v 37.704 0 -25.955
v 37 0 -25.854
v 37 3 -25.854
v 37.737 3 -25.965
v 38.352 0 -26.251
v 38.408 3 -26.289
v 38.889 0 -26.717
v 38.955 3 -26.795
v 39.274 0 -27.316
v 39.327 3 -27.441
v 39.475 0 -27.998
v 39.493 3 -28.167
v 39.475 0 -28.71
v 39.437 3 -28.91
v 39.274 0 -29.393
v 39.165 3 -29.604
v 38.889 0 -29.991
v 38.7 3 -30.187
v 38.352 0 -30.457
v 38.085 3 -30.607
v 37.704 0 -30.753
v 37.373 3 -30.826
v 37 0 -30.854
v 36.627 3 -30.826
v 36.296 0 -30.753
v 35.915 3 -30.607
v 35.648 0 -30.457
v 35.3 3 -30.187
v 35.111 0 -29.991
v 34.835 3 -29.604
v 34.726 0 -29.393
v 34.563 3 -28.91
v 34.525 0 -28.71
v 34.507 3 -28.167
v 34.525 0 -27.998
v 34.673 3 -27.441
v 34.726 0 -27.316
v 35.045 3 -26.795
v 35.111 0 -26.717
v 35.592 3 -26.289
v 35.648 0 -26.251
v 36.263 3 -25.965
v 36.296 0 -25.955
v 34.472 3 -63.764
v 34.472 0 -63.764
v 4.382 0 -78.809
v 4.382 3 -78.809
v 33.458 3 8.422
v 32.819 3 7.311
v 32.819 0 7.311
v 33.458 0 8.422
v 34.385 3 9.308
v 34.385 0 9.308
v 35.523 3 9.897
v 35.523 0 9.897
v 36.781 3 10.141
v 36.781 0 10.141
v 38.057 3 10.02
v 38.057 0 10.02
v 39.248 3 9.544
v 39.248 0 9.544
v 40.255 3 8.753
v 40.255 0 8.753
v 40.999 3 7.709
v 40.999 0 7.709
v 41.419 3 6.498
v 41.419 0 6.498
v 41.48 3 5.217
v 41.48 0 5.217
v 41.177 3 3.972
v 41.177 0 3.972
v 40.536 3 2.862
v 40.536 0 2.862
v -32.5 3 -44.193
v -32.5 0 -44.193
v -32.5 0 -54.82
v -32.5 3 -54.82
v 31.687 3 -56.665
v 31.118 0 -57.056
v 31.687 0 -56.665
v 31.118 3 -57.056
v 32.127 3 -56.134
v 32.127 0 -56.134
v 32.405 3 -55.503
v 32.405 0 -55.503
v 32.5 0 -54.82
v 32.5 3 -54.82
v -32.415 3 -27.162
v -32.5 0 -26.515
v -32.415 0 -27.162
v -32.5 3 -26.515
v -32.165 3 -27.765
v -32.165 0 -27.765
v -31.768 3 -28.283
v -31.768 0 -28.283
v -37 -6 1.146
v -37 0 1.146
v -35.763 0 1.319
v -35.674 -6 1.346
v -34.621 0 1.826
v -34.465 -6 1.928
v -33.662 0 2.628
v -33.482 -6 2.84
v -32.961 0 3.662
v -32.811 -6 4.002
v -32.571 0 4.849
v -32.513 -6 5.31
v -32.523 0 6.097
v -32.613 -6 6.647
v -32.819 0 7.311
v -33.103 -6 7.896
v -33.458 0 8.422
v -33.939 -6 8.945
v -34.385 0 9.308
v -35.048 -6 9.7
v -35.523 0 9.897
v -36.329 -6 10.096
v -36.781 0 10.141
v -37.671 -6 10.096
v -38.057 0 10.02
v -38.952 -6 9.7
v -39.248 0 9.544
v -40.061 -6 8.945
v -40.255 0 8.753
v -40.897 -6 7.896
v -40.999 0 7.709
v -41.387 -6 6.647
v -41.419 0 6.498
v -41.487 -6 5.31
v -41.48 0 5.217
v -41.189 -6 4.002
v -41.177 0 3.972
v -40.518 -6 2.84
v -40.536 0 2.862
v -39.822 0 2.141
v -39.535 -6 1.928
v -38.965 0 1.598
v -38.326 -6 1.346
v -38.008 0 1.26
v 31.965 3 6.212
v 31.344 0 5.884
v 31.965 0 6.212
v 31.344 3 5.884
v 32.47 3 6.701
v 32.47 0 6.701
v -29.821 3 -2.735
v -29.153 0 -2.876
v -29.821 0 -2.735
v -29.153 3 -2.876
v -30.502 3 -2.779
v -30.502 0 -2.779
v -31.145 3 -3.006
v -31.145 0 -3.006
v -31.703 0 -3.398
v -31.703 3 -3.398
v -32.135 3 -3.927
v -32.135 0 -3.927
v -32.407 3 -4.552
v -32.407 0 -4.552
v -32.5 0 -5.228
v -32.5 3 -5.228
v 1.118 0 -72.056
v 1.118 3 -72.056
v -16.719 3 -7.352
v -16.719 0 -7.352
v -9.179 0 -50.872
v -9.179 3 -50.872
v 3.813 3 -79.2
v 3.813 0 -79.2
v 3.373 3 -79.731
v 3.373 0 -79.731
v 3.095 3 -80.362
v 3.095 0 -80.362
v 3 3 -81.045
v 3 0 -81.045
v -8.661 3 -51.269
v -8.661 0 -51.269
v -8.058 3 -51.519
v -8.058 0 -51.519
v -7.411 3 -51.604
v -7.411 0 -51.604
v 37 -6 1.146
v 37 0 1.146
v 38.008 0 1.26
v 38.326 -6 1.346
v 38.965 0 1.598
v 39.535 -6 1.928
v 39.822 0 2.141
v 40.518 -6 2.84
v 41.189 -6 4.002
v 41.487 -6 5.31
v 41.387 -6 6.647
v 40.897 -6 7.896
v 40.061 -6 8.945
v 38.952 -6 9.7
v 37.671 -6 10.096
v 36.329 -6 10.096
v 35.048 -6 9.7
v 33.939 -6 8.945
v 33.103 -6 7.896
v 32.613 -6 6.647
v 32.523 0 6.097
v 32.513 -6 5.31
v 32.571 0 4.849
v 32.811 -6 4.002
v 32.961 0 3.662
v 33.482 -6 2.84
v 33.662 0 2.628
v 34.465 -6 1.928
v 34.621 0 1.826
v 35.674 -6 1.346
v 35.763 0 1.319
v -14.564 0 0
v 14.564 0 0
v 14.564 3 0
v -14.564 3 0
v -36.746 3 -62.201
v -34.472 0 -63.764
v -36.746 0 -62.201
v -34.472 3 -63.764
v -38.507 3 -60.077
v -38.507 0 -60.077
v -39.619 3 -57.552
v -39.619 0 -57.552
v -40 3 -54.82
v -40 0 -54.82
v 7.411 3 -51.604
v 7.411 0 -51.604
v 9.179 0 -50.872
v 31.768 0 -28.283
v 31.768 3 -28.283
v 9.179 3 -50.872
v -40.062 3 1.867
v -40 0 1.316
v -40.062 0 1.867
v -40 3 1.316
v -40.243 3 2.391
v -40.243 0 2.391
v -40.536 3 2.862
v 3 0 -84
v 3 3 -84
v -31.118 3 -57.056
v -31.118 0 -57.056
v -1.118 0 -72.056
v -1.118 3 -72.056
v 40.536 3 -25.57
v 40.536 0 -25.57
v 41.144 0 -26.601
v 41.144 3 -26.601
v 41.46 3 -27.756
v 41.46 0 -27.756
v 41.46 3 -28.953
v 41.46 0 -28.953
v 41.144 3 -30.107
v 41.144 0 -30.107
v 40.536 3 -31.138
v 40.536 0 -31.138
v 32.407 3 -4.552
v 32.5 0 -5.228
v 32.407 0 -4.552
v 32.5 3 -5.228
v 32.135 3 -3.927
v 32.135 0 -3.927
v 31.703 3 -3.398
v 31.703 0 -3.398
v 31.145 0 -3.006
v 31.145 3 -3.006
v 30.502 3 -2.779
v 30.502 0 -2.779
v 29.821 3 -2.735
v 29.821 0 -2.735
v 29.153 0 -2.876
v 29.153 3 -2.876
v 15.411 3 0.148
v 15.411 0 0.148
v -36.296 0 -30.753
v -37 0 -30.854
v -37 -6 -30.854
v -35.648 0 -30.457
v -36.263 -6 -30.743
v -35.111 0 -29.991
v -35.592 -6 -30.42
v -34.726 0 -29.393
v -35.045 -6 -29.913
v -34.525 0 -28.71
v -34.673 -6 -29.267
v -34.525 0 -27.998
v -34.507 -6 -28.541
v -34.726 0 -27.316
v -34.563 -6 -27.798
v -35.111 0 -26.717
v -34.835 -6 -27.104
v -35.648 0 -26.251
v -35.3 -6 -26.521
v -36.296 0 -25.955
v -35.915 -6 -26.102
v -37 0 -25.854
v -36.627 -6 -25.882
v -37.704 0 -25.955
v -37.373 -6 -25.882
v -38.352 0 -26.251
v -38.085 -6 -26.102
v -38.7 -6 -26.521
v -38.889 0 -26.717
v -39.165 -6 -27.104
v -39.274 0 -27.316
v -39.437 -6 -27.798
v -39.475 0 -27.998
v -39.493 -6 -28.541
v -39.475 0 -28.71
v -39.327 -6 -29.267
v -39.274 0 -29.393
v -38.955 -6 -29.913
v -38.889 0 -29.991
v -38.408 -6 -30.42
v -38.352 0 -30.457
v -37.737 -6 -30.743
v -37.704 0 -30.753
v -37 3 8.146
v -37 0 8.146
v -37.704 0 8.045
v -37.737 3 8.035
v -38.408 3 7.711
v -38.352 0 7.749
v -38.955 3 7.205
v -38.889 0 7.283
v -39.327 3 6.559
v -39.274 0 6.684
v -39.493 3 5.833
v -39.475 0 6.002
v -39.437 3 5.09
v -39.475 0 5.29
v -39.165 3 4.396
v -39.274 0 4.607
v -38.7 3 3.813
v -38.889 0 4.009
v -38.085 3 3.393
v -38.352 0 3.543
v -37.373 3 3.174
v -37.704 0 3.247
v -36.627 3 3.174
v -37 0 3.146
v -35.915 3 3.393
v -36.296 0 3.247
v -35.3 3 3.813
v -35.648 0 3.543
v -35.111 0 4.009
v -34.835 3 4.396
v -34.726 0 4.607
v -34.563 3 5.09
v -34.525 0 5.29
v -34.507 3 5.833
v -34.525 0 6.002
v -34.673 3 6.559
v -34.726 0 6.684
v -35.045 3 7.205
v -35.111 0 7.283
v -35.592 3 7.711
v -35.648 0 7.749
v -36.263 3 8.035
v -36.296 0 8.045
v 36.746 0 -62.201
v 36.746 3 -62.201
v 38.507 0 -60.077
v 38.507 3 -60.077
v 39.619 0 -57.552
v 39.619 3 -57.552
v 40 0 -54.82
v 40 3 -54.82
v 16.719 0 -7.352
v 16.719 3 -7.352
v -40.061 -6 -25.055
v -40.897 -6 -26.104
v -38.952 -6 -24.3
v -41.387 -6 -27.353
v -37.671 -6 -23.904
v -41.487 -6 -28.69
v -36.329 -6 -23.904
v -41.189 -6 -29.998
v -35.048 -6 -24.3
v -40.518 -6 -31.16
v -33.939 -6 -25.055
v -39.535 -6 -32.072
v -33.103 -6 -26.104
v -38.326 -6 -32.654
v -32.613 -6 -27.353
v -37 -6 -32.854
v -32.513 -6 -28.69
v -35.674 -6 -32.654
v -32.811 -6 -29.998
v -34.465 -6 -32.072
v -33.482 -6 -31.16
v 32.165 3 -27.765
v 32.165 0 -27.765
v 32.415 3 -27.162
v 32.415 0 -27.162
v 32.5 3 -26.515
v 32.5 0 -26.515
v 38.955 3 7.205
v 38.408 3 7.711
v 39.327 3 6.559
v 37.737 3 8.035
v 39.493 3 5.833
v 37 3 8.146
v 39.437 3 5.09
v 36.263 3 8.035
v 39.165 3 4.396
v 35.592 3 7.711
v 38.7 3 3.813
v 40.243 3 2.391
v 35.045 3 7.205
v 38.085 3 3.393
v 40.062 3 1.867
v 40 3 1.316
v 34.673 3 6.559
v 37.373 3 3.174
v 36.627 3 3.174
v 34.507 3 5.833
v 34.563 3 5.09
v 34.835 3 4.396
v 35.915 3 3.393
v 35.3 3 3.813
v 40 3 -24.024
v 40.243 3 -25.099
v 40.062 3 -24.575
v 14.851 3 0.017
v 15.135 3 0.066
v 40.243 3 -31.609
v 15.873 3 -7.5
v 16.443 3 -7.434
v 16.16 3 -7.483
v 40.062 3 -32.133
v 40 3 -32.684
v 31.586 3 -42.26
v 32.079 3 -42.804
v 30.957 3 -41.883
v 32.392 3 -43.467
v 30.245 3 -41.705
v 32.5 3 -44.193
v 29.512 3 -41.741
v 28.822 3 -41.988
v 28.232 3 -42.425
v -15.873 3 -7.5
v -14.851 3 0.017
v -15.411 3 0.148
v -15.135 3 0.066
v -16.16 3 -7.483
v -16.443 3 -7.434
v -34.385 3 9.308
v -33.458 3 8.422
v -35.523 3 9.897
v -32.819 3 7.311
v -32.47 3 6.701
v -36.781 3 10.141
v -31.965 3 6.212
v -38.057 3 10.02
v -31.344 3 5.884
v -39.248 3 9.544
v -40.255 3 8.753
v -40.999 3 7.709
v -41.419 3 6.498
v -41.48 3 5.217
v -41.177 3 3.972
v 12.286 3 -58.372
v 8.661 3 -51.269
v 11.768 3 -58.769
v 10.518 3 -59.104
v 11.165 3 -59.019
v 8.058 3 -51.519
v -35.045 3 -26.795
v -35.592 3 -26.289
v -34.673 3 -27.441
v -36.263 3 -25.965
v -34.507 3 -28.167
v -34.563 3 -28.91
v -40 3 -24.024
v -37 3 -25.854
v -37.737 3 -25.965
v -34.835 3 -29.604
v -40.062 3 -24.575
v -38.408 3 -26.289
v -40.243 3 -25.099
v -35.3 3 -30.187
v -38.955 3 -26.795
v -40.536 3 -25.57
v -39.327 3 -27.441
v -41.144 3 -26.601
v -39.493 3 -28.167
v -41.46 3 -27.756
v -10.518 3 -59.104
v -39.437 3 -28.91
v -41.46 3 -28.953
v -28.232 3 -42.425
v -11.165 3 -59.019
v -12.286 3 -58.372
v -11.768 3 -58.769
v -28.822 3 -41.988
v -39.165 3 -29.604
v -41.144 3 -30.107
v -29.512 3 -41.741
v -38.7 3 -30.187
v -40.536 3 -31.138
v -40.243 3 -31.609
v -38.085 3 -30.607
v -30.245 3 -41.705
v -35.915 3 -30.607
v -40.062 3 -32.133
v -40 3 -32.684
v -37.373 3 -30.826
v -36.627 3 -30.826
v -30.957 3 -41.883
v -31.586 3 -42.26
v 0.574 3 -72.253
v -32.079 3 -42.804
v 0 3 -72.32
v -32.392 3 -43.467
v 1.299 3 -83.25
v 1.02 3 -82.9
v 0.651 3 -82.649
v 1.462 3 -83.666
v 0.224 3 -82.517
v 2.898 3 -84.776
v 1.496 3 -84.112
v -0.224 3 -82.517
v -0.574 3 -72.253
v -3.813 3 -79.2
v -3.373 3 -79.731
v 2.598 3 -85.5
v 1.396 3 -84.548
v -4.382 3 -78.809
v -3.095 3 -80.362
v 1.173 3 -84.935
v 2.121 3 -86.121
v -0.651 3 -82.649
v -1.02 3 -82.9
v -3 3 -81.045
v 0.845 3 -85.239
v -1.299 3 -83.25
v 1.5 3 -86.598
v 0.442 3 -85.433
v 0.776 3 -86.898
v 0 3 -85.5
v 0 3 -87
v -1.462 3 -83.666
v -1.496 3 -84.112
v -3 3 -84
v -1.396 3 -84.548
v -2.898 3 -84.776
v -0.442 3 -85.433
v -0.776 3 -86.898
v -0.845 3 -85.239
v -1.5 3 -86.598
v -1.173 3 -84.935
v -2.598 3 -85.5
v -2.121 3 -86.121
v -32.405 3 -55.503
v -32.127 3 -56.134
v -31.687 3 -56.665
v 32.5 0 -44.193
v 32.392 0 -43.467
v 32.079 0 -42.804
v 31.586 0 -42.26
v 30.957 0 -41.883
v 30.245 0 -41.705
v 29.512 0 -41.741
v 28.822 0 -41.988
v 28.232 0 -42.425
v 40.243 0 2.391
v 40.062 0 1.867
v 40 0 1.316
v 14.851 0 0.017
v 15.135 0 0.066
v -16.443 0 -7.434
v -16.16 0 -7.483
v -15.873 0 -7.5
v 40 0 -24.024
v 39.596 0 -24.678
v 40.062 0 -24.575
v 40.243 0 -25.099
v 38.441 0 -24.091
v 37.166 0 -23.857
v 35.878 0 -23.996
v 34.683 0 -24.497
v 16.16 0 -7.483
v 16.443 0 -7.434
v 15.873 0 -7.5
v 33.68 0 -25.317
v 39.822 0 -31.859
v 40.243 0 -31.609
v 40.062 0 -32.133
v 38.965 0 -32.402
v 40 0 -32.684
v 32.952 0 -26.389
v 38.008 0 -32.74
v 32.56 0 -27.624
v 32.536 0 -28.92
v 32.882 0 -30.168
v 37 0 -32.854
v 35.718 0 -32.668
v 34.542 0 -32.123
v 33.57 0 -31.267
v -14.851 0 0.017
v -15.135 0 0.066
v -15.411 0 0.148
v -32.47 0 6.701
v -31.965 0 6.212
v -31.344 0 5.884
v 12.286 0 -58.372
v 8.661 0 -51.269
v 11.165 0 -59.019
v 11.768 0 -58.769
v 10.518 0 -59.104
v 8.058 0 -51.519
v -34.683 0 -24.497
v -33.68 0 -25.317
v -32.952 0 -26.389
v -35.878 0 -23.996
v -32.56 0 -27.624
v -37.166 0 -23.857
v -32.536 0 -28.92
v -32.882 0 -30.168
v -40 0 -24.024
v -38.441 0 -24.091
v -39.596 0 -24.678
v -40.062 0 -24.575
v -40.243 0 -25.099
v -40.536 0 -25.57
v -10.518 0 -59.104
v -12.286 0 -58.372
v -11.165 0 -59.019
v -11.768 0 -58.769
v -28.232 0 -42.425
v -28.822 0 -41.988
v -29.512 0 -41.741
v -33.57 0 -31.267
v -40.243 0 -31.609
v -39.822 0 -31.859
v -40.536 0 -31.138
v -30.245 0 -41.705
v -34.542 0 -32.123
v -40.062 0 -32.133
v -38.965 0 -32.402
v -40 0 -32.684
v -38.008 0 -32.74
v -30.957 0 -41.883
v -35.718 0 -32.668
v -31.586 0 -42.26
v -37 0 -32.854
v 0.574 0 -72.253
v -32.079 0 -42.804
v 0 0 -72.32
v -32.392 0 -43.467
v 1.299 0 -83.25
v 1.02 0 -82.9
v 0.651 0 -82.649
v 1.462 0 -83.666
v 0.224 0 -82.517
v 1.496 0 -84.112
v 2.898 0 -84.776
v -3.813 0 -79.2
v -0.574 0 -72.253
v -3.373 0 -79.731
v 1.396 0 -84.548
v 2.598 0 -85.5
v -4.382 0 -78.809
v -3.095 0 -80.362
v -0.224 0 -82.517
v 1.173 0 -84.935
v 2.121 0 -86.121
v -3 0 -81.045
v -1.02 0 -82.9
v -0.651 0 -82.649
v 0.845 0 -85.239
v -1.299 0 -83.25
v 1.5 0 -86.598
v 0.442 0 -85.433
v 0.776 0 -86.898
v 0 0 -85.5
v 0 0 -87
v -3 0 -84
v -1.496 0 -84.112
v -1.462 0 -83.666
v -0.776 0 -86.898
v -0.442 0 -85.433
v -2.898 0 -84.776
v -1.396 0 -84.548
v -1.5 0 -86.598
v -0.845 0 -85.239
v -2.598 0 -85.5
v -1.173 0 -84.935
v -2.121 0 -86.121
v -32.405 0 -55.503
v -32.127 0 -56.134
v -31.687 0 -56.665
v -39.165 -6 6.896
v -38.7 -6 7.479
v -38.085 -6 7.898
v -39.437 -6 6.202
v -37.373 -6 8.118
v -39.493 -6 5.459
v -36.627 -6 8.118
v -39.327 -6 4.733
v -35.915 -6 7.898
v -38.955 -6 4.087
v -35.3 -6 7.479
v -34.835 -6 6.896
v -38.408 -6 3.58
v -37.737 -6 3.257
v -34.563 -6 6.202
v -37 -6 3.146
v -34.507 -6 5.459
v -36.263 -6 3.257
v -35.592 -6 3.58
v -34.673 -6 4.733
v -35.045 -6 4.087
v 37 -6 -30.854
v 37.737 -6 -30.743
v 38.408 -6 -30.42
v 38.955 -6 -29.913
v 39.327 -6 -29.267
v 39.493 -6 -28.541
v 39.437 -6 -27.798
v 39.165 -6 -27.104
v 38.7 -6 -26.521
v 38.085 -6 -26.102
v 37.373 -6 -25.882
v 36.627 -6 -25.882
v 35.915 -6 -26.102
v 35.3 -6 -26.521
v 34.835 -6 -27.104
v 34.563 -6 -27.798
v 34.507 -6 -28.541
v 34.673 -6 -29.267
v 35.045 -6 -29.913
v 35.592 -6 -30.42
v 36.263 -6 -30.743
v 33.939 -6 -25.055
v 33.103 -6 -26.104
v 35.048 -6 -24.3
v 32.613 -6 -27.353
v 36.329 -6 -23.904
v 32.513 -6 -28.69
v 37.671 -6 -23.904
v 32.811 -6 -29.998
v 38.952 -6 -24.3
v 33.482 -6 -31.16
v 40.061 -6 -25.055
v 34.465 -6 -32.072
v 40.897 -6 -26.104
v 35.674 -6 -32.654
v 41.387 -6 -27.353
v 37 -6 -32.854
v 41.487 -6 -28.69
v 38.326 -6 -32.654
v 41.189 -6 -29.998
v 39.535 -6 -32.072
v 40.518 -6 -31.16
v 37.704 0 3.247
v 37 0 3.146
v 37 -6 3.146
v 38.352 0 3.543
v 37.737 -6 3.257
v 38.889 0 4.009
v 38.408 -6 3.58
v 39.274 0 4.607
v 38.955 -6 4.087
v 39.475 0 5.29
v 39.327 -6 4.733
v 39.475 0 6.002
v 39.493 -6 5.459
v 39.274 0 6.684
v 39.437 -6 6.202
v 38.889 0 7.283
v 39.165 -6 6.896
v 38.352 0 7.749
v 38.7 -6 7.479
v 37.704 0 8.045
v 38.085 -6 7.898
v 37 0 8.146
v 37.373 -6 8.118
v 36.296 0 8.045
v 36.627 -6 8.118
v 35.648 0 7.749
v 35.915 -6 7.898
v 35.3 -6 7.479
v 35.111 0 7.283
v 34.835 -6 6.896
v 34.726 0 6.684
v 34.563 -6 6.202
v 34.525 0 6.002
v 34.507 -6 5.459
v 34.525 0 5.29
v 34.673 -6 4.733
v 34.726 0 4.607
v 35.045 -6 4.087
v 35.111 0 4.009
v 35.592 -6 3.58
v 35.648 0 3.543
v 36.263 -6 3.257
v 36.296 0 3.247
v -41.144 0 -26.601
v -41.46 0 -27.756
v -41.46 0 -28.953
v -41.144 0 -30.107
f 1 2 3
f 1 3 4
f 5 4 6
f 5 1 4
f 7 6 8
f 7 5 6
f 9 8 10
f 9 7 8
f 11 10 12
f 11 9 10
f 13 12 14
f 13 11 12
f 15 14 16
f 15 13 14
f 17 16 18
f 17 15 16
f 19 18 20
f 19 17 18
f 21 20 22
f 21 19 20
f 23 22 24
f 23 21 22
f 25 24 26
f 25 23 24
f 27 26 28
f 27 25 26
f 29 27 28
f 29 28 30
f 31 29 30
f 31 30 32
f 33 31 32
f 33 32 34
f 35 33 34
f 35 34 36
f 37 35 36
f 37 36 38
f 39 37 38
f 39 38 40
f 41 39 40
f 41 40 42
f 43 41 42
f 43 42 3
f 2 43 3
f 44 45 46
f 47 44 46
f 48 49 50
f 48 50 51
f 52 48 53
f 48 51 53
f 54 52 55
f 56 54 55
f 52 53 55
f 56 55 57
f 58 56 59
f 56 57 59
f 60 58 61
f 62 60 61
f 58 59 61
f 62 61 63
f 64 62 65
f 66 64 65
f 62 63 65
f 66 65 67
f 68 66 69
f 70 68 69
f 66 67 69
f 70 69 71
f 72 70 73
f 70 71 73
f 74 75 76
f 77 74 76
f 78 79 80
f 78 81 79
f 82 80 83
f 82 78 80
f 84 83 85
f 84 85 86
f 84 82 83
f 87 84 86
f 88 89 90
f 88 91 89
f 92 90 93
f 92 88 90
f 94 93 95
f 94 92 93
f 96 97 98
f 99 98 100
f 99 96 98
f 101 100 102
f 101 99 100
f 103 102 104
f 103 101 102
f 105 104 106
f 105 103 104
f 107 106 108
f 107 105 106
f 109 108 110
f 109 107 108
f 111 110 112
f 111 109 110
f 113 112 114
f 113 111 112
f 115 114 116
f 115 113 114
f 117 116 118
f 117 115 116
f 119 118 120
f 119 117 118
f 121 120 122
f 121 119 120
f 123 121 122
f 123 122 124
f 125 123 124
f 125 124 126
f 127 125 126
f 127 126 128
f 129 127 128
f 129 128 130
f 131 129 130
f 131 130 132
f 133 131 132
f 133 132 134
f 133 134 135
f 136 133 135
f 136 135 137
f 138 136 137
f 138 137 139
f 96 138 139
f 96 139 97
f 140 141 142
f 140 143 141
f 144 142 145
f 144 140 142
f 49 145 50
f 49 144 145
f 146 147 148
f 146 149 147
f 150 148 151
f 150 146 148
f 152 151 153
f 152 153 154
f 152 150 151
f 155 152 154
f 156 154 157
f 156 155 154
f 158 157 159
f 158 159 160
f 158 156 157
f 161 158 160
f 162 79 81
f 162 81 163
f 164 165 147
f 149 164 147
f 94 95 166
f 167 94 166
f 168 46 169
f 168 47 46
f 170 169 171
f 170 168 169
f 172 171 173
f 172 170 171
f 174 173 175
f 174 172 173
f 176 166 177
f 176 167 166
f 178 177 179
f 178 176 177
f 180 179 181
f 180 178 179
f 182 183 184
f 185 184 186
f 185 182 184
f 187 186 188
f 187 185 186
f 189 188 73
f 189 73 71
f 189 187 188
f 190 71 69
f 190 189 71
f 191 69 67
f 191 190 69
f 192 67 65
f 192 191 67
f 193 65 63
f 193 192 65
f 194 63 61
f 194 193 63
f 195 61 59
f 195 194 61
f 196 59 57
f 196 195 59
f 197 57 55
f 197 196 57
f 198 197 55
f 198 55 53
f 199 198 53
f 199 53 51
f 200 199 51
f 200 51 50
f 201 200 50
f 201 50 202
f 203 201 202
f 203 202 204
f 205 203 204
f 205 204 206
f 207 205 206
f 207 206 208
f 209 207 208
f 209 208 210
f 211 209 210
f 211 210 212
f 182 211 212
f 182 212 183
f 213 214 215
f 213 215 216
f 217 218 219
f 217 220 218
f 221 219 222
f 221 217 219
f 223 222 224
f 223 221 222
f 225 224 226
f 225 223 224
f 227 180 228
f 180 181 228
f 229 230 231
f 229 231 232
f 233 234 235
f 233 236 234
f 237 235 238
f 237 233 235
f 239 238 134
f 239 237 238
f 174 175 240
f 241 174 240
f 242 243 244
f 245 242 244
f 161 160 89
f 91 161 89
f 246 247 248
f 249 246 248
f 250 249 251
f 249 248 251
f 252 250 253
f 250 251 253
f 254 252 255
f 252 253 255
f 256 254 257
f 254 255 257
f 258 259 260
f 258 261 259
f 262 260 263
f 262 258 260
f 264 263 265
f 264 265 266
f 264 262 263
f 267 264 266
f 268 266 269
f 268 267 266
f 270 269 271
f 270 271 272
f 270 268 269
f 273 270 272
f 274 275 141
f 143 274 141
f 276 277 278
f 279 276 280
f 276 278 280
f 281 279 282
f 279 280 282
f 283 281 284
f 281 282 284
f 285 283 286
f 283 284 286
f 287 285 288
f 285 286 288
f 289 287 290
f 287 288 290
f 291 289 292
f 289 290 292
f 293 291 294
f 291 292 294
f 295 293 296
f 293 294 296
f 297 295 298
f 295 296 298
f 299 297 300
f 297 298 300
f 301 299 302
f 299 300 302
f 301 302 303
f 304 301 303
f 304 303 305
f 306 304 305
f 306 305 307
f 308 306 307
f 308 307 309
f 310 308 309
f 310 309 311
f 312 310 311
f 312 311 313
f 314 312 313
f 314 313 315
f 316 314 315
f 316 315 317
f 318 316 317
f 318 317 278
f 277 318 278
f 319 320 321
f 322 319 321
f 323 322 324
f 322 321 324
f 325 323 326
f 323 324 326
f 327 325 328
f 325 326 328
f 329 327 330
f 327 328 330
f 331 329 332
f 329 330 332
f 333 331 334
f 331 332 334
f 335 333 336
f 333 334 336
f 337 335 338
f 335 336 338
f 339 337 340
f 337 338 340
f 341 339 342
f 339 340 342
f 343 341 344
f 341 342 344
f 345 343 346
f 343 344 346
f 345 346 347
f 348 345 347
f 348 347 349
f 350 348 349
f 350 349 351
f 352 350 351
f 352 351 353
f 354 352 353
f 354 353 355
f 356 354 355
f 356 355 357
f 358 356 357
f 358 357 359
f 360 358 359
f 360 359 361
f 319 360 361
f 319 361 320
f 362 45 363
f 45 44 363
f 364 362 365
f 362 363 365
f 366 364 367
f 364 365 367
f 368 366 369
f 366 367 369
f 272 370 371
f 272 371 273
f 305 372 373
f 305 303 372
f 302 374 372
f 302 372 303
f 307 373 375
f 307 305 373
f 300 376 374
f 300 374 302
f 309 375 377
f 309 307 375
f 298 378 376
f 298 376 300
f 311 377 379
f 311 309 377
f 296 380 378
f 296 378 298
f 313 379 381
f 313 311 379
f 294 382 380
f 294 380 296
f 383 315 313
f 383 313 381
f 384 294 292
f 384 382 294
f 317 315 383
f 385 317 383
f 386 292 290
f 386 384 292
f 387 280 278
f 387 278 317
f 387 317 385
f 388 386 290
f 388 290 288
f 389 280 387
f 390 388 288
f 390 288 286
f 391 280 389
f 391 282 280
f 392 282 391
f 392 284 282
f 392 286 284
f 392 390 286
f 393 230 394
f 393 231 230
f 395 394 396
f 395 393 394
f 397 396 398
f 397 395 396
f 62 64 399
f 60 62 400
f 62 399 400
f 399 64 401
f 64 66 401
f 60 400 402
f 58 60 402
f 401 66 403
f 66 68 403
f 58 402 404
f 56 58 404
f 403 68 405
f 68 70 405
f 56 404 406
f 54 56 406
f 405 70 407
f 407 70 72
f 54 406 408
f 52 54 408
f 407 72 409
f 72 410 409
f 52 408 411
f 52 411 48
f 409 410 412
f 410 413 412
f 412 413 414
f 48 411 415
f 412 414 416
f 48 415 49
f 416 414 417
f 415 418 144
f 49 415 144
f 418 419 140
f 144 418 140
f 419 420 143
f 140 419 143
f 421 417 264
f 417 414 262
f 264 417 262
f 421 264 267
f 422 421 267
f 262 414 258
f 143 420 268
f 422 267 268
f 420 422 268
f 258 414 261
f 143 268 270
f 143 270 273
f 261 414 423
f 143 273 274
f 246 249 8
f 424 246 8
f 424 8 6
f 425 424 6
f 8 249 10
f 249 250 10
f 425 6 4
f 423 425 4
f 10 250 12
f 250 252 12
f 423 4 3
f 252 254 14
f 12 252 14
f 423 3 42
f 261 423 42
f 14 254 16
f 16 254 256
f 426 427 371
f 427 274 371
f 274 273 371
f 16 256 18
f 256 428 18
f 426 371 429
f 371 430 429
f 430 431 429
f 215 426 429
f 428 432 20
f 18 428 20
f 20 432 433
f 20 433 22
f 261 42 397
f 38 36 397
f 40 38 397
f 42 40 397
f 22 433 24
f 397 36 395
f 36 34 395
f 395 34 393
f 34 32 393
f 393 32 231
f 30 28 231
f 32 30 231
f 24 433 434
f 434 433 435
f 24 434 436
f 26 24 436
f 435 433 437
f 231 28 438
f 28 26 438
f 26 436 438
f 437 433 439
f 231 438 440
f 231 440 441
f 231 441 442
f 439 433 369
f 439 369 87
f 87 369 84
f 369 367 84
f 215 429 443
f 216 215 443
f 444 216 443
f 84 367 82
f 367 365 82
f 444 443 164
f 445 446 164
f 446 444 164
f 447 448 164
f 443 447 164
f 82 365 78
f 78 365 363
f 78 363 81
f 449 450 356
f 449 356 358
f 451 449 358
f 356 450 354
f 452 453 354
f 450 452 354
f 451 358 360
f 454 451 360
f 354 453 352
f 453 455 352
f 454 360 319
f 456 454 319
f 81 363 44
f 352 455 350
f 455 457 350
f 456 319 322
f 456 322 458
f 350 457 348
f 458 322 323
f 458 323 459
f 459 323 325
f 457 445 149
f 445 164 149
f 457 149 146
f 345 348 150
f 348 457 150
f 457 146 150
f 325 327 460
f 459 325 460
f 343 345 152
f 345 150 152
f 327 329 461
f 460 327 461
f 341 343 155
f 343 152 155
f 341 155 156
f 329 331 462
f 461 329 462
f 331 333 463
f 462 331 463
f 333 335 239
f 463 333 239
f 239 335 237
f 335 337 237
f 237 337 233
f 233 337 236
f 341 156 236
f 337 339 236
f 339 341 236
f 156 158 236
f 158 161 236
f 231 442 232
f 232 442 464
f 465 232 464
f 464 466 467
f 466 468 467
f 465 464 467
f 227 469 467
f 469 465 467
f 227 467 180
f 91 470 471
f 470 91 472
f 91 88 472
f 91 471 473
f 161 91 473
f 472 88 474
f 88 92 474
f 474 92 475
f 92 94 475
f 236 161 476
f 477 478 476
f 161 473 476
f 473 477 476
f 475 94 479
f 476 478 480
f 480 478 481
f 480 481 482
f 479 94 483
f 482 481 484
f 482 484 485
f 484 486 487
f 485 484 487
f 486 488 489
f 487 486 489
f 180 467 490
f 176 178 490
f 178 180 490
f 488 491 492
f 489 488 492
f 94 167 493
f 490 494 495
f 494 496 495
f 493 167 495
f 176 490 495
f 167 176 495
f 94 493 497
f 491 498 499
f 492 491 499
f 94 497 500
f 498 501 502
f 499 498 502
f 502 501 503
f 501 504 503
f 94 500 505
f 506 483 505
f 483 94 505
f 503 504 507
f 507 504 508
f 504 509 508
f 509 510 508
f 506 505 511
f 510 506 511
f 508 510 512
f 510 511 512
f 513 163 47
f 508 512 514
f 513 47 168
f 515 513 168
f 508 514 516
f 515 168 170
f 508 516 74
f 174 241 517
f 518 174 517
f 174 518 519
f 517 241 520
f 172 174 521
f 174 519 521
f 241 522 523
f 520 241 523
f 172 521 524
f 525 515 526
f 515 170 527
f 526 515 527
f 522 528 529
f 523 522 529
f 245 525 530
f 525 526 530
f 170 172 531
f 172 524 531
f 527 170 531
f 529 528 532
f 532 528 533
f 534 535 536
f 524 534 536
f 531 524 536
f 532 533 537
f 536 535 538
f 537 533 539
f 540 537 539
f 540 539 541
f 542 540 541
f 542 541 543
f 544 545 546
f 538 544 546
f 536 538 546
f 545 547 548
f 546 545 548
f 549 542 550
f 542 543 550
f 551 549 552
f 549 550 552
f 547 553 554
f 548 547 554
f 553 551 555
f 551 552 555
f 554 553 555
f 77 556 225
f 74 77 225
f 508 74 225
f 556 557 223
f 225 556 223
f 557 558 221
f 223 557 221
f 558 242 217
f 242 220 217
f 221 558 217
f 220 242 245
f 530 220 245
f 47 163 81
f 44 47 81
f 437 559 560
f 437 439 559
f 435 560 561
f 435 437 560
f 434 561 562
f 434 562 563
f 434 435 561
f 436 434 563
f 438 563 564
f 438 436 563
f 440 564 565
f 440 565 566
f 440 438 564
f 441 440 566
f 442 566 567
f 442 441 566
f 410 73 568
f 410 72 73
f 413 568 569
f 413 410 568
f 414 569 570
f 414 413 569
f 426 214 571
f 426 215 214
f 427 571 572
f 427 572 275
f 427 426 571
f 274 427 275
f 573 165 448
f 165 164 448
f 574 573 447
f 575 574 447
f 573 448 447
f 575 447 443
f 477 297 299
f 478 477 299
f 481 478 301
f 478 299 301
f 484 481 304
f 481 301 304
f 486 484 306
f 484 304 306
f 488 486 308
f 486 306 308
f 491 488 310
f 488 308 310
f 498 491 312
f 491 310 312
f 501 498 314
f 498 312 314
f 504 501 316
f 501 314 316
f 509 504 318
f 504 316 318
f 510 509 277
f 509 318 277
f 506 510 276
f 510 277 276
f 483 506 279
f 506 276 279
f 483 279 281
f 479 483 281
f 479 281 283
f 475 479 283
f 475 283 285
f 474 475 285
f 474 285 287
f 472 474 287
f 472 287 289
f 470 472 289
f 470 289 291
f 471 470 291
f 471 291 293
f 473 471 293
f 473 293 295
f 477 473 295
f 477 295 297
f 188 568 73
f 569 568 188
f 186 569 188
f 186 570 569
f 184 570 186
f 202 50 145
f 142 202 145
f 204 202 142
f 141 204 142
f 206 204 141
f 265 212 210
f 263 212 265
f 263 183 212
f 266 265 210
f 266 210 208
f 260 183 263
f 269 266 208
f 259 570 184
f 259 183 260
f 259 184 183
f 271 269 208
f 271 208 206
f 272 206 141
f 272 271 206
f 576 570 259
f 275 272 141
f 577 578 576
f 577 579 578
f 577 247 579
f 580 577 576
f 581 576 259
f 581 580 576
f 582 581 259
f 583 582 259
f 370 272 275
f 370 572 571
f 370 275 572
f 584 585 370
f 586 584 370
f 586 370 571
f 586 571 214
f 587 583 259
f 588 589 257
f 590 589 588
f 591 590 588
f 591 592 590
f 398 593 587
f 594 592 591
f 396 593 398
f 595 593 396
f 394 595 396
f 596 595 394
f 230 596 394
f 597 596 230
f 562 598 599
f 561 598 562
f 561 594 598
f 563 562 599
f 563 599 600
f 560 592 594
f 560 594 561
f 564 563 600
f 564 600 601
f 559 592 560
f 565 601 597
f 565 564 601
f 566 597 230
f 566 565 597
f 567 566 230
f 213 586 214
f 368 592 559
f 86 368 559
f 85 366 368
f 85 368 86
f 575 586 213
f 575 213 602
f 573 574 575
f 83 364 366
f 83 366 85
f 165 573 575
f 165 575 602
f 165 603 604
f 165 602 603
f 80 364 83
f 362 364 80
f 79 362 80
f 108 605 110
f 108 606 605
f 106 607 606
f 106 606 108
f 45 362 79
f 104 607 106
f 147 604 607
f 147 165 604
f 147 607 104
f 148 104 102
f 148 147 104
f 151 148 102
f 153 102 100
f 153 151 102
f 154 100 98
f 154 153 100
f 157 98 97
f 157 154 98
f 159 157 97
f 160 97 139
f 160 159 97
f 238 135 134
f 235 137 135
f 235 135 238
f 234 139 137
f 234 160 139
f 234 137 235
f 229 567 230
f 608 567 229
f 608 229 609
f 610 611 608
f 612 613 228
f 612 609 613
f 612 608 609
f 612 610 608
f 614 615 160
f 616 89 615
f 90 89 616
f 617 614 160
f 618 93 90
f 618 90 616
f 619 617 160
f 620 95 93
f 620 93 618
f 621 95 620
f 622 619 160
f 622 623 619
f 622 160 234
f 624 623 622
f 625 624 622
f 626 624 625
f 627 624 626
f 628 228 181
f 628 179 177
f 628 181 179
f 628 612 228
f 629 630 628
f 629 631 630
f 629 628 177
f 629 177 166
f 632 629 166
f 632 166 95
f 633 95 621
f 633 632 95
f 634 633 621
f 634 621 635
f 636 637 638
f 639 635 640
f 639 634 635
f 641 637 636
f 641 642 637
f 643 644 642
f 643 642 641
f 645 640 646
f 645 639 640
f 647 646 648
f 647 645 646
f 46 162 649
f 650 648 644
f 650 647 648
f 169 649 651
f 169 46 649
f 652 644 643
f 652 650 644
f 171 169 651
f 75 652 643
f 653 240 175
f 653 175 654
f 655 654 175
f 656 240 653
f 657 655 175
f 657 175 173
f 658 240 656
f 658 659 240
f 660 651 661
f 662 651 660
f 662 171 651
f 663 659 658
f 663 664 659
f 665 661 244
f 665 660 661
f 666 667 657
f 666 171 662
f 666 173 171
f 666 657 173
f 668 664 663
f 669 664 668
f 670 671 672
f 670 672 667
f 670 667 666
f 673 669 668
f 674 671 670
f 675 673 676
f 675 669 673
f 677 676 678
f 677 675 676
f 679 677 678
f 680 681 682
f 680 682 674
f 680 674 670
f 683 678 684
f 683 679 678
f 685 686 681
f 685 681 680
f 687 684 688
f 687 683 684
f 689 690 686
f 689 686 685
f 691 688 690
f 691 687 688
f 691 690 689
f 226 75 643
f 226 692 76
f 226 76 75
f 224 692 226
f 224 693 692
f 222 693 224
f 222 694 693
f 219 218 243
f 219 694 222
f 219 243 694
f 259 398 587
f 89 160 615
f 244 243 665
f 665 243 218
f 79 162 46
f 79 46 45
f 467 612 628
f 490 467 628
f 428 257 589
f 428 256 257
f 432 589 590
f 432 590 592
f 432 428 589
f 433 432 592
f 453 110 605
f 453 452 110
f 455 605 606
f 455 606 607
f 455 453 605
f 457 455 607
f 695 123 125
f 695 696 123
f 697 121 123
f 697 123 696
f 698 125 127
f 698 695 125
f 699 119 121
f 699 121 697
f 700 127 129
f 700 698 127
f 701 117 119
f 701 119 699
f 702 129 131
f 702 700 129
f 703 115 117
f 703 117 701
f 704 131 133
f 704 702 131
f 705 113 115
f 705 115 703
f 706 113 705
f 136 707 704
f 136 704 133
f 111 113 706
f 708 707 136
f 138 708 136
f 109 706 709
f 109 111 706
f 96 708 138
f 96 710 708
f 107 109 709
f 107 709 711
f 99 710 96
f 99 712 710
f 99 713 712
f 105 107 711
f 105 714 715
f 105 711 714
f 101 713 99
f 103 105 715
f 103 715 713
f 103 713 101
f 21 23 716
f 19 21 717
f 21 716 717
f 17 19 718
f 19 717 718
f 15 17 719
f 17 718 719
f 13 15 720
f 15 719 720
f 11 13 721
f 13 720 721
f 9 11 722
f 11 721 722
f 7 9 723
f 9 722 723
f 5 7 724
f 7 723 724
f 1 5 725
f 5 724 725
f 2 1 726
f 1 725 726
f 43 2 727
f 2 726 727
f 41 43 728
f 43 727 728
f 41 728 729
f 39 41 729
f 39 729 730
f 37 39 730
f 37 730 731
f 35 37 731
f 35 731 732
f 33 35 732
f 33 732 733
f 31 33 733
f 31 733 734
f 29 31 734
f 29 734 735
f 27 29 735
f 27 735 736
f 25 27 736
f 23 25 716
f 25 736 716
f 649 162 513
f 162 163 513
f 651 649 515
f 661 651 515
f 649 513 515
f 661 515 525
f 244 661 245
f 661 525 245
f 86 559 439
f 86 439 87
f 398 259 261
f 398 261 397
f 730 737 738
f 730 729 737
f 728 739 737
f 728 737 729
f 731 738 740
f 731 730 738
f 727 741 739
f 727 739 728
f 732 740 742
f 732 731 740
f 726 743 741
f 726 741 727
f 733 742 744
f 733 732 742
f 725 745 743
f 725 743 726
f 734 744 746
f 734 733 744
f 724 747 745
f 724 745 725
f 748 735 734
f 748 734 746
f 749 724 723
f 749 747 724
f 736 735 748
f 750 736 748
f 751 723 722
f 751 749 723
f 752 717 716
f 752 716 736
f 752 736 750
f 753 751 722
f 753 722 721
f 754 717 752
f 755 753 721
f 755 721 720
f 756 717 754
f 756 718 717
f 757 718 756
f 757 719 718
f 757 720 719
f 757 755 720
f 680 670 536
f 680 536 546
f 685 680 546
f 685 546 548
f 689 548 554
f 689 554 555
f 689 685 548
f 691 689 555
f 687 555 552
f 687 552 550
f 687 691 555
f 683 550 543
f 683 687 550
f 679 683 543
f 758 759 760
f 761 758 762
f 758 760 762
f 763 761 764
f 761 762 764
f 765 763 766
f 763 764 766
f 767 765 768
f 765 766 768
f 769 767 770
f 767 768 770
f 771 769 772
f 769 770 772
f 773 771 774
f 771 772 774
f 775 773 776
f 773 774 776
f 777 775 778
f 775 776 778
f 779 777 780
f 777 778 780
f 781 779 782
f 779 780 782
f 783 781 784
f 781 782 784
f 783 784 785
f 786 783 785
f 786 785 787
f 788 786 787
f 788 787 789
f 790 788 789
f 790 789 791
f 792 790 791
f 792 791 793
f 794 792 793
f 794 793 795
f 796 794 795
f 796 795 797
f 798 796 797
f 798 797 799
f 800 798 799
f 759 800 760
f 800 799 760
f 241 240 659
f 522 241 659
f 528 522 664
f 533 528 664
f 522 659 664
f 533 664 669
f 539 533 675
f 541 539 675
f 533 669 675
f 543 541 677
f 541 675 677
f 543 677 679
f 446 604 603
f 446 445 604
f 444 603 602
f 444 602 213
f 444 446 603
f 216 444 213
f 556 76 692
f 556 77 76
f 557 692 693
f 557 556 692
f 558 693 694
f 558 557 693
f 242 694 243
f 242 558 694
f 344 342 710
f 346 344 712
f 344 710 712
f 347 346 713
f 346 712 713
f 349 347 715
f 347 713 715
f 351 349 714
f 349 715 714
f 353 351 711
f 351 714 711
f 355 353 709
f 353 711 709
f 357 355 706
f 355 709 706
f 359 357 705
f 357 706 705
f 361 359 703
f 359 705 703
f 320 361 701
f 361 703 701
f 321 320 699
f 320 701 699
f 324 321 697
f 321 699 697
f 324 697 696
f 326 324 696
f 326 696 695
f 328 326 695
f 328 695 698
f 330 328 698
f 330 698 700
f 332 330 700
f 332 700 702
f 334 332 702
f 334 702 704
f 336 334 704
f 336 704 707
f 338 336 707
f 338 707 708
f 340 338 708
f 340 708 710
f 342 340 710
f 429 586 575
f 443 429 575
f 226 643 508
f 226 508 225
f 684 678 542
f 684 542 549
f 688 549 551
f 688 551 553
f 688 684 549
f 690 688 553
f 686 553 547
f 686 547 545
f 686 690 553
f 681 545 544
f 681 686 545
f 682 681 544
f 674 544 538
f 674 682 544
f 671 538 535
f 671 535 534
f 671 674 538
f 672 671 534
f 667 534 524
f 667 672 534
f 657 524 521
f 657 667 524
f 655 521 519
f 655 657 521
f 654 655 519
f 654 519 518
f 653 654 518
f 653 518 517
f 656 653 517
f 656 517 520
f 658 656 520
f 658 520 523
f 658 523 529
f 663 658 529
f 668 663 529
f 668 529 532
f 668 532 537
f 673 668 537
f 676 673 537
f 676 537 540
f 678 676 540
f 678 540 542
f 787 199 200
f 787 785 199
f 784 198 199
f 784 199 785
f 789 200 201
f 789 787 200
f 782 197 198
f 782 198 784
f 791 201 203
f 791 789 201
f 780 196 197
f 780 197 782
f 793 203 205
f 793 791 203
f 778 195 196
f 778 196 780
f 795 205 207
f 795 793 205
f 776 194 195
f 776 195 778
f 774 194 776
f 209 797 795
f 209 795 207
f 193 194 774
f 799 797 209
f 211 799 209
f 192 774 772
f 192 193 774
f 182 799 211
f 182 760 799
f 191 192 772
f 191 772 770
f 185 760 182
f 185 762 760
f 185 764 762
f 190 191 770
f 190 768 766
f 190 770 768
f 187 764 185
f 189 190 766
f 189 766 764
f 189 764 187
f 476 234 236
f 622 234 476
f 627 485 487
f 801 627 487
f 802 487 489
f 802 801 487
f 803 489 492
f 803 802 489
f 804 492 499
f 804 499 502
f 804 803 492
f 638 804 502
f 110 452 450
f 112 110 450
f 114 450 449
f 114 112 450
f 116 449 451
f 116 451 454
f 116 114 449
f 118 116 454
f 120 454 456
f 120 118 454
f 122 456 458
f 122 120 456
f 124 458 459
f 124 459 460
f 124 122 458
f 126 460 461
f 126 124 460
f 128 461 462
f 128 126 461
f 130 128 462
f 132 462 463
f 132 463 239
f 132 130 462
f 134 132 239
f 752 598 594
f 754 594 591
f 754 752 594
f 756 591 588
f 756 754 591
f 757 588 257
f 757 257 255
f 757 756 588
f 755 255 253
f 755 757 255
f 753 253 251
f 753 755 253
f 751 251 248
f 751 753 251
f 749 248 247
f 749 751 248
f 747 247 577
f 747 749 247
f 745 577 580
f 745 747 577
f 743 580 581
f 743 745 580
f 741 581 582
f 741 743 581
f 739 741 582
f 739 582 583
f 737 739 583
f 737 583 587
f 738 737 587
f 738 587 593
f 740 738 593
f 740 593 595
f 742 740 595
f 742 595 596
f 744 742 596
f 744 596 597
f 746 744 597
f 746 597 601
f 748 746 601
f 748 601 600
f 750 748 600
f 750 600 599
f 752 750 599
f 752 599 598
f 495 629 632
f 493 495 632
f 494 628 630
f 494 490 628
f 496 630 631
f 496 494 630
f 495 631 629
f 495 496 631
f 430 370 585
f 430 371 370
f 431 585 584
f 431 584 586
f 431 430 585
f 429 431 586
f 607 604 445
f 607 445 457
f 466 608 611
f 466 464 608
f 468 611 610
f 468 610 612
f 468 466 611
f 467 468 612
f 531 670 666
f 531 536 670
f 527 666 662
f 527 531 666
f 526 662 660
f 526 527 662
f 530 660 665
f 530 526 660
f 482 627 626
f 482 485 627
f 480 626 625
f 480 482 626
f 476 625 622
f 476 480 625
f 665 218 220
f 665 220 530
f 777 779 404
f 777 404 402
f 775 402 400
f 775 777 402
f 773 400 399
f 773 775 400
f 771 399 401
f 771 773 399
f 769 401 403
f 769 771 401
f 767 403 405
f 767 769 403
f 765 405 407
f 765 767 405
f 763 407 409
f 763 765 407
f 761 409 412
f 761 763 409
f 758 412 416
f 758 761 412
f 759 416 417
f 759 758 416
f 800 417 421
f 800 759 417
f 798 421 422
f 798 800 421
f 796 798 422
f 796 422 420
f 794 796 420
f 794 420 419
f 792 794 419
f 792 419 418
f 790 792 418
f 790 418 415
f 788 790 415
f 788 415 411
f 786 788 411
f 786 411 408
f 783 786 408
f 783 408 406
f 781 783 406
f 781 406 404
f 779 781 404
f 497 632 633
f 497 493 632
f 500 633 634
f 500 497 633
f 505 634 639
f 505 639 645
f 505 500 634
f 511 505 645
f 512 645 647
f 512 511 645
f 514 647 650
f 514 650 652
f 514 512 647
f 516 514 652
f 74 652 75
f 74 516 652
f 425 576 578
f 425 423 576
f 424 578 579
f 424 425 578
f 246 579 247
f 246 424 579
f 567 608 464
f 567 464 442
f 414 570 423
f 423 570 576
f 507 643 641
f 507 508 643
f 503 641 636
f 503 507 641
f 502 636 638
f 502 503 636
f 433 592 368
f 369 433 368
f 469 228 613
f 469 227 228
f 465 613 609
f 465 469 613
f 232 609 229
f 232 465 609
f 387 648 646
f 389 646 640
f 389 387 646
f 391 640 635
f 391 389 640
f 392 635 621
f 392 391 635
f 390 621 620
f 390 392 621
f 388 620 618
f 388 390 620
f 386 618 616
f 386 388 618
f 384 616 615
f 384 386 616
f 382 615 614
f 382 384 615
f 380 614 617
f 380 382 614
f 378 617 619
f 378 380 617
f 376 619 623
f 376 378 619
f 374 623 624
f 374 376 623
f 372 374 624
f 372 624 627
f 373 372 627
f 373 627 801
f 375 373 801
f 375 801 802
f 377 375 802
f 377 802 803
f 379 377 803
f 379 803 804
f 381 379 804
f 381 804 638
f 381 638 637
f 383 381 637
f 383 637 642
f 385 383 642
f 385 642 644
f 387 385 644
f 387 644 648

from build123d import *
from build123d.topology import SkipClean

# Parameters (mm, degrees)
SKETCH1_R            = 2.5
BOSS_EXTRUDE1_DEPTH  = 3
CUT_EXTRUDE2_START   = -3
CUT_EXTRUDE2_DEPTH   = 3
FILLET2_R            = 10
FILLET2_OF_MIRROR1_R = 10
FILLET3_R            = 2.5
BOSS_EXTRUDE2_START  = 6
SKETCH4_R            = 4.5
SKETCH4_R_2          = 2.5
BOSS_EXTRUDE2_DEPTH  = 6


# Read off the part's stored shape, not the designer's step: Cut-Extrude2
with BuildPart() as part:
    # Sketch1 → Boss-Extrude1 (new body)
    with BuildSketch(Plane(origin=(0, 0, 0), x_dir=(1, 0, 0), z_dir=(0, 1, 0))):
        with BuildLine():
            Line((0, 0), (15, 0))
            Line((15, 0), (32.55050158, -6.318180569))
            ThreePointArc((32.55050158, -6.318180569), (39.139673913, -9.604659904), (40, -2.291796068))
            Line((40, -2.291796068), (40, 25))
            ThreePointArc((40, 25), (41.5, 28.354101966), (40, 31.708203932))
            Line((40, 31.708203932), (40, 61))
            Line((40, 61), (3, 79.5))
            Line((3, 79.5), (3, 84))
            ThreePointArc((3, 84), (2.121320344, 86.121320344), (0, 87))
            Line((0, 87), (0, 85.5))
            ThreePointArc((0, 85.5), (1.5, 84), (0, 82.5))
            Line((0, 82.5), (0, 0))
        make_face()
        with Locations(Location((37, -5.645898034, 0), (0, 0, 270))):
            Circle(SKETCH1_R, mode=Mode.SUBTRACT)
        with Locations(Location((37, 28.354101966, 0), (0, 0, 270))):
            Circle(SKETCH1_R, mode=Mode.SUBTRACT)
    boss_extrude1 = extrude(amount=BOSS_EXTRUDE1_DEPTH)

    # Cut-Extrude2 outline → Cut-Extrude2 (cut)
    with BuildSketch(Plane(origin=(0, 3, 0), x_dir=(1, 0, 0), z_dir=(0, 1, 0)).offset(CUT_EXTRUDE2_START)):
        Polygon((0, 7.5), (16.308883759, 7.5), (32.5, 1.671198153), (32.5, 27.550801107), (8.446699141, 51.604101966), (0, 51.604101966), align=None)
        Polygon((0, 72.614745084), (0, 59.104101966), (11.553300859, 59.104101966), (32.5, 38.157402825), (32.5, 56.364745084), align=None)
    cut_extrude2 = extrude(amount=CUT_EXTRUDE2_DEPTH, mode=Mode.SUBTRACT)

    # Fillet2
    fillet2_edges = [part.edges().sort_by_distance(p)[0] for p in [
        (40, 1.5, -61),
    ]]
    fillet(fillet2_edges, radius=FILLET2_R)

    # Mirror1: Boss-Extrude1, Cut-Extrude2 across plane
    with SkipClean():  # the faces are left unmerged after this step: merging them gives an invalid solid
        add(boss_extrude1.mirror(Plane(origin=(0, 0, 0), x_dir=(0, 0, 1), z_dir=(1, 0, 0))))
        add(cut_extrude2.mirror(Plane(origin=(0, 0, 0), x_dir=(0, 0, 1), z_dir=(1, 0, 0))), mode=Mode.SUBTRACT)

    # Fillet2 of Mirror1
    fillet2_of_mirror1_edges = [part.edges().sort_by_distance(p)[0] for p in [
        (-40, 1.5, -61),
    ]]
    fillet(fillet2_of_mirror1_edges, radius=FILLET2_OF_MIRROR1_R)

    # Fillet3
    fillet3_edges = [part.edges().sort_by_distance(p)[0] for p in [
        (-40, 1.5, 2.291796068),
        (-32.55050158, 1.5, 6.318180569),
        (-15, 1.5, 0),
        (-3, 1.5, -79.5),
        (-40, 1.5, -31.708203932),
        (-40, 1.5, -25),
        (-16.308883759, 1.5, -7.5),
        (-32.5, 1.5, -1.671198153),
        (-32.5, 1.5, -27.550801107),
        (-8.446699141, 1.5, -51.604101966),
        (-11.553300859, 1.5, -59.104101966),
        (-32.5, 1.5, -38.157402825),
        (-32.5, 1.5, -56.364745084),
        (32.55050158, 1.5, 6.318180569),
        (15, 1.5, 0),
        (3, 1.5, -79.5),
        (40, 1.5, -31.708203932),
        (40, 1.5, -25),
        (40, 1.5, 2.291796068),
        (32.5, 1.5, -1.671198153),
        (16.308883759, 1.5, -7.5),
        (8.446699141, 1.5, -51.604101966),
        (32.5, 1.5, -27.550801107),
        (32.5, 1.5, -38.157402825),
        (11.553300859, 1.5, -59.104101966),
        (0, 1.5, -72.614745084),
        (32.5, 1.5, -56.364745084),
    ]]
    fillet(fillet3_edges, radius=FILLET3_R)

    # Sketch4 → Boss-Extrude2 (add)
    # profile 1 of 4: a face of its own
    with SkipClean():  # the faces are left unmerged after this step: merging them gives an invalid solid
        with BuildSketch(Plane.XZ.offset(BOSS_EXTRUDE2_START)):
            with Locations(Location((37, -28.354101966, 0), (0, 0, 270))):
                Circle(SKETCH4_R)
            with Locations(Location((37, -28.354101966, 0), (0, 0, 270))):
                Circle(SKETCH4_R_2, mode=Mode.SUBTRACT)
        # profile 2 of 4: a face of its own
        with BuildSketch(Plane.XZ.offset(BOSS_EXTRUDE2_START)):
            with Locations(Location((37, 5.645898034, 0), (0, 0, 270))):
                Circle(SKETCH4_R)
            with Locations(Location((37, 5.645898034, 0), (0, 0, 270))):
                Circle(SKETCH4_R_2, mode=Mode.SUBTRACT)
        # profile 3 of 4: a face of its own
        with BuildSketch(Plane.XZ.offset(BOSS_EXTRUDE2_START)):
            with Locations(Location((-37, -28.354101966, 0), (0, 0, 270))):
                Circle(SKETCH4_R)
            with Locations(Location((-37, -28.354101966, 0), (0, 0, 270))):
                Circle(SKETCH4_R_2, mode=Mode.SUBTRACT)
        # profile 4 of 4: a face of its own
        with BuildSketch(Plane.XZ.offset(BOSS_EXTRUDE2_START)):
            with Locations(Location((-37, 5.645898034, 0), (0, 0, 270))):
                Circle(SKETCH4_R)
            with Locations(Location((-37, 5.645898034, 0), (0, 0, 270))):
                Circle(SKETCH4_R_2, mode=Mode.SUBTRACT)
        extrude(amount=-BOSS_EXTRUDE2_DEPTH)


solid = part.part
